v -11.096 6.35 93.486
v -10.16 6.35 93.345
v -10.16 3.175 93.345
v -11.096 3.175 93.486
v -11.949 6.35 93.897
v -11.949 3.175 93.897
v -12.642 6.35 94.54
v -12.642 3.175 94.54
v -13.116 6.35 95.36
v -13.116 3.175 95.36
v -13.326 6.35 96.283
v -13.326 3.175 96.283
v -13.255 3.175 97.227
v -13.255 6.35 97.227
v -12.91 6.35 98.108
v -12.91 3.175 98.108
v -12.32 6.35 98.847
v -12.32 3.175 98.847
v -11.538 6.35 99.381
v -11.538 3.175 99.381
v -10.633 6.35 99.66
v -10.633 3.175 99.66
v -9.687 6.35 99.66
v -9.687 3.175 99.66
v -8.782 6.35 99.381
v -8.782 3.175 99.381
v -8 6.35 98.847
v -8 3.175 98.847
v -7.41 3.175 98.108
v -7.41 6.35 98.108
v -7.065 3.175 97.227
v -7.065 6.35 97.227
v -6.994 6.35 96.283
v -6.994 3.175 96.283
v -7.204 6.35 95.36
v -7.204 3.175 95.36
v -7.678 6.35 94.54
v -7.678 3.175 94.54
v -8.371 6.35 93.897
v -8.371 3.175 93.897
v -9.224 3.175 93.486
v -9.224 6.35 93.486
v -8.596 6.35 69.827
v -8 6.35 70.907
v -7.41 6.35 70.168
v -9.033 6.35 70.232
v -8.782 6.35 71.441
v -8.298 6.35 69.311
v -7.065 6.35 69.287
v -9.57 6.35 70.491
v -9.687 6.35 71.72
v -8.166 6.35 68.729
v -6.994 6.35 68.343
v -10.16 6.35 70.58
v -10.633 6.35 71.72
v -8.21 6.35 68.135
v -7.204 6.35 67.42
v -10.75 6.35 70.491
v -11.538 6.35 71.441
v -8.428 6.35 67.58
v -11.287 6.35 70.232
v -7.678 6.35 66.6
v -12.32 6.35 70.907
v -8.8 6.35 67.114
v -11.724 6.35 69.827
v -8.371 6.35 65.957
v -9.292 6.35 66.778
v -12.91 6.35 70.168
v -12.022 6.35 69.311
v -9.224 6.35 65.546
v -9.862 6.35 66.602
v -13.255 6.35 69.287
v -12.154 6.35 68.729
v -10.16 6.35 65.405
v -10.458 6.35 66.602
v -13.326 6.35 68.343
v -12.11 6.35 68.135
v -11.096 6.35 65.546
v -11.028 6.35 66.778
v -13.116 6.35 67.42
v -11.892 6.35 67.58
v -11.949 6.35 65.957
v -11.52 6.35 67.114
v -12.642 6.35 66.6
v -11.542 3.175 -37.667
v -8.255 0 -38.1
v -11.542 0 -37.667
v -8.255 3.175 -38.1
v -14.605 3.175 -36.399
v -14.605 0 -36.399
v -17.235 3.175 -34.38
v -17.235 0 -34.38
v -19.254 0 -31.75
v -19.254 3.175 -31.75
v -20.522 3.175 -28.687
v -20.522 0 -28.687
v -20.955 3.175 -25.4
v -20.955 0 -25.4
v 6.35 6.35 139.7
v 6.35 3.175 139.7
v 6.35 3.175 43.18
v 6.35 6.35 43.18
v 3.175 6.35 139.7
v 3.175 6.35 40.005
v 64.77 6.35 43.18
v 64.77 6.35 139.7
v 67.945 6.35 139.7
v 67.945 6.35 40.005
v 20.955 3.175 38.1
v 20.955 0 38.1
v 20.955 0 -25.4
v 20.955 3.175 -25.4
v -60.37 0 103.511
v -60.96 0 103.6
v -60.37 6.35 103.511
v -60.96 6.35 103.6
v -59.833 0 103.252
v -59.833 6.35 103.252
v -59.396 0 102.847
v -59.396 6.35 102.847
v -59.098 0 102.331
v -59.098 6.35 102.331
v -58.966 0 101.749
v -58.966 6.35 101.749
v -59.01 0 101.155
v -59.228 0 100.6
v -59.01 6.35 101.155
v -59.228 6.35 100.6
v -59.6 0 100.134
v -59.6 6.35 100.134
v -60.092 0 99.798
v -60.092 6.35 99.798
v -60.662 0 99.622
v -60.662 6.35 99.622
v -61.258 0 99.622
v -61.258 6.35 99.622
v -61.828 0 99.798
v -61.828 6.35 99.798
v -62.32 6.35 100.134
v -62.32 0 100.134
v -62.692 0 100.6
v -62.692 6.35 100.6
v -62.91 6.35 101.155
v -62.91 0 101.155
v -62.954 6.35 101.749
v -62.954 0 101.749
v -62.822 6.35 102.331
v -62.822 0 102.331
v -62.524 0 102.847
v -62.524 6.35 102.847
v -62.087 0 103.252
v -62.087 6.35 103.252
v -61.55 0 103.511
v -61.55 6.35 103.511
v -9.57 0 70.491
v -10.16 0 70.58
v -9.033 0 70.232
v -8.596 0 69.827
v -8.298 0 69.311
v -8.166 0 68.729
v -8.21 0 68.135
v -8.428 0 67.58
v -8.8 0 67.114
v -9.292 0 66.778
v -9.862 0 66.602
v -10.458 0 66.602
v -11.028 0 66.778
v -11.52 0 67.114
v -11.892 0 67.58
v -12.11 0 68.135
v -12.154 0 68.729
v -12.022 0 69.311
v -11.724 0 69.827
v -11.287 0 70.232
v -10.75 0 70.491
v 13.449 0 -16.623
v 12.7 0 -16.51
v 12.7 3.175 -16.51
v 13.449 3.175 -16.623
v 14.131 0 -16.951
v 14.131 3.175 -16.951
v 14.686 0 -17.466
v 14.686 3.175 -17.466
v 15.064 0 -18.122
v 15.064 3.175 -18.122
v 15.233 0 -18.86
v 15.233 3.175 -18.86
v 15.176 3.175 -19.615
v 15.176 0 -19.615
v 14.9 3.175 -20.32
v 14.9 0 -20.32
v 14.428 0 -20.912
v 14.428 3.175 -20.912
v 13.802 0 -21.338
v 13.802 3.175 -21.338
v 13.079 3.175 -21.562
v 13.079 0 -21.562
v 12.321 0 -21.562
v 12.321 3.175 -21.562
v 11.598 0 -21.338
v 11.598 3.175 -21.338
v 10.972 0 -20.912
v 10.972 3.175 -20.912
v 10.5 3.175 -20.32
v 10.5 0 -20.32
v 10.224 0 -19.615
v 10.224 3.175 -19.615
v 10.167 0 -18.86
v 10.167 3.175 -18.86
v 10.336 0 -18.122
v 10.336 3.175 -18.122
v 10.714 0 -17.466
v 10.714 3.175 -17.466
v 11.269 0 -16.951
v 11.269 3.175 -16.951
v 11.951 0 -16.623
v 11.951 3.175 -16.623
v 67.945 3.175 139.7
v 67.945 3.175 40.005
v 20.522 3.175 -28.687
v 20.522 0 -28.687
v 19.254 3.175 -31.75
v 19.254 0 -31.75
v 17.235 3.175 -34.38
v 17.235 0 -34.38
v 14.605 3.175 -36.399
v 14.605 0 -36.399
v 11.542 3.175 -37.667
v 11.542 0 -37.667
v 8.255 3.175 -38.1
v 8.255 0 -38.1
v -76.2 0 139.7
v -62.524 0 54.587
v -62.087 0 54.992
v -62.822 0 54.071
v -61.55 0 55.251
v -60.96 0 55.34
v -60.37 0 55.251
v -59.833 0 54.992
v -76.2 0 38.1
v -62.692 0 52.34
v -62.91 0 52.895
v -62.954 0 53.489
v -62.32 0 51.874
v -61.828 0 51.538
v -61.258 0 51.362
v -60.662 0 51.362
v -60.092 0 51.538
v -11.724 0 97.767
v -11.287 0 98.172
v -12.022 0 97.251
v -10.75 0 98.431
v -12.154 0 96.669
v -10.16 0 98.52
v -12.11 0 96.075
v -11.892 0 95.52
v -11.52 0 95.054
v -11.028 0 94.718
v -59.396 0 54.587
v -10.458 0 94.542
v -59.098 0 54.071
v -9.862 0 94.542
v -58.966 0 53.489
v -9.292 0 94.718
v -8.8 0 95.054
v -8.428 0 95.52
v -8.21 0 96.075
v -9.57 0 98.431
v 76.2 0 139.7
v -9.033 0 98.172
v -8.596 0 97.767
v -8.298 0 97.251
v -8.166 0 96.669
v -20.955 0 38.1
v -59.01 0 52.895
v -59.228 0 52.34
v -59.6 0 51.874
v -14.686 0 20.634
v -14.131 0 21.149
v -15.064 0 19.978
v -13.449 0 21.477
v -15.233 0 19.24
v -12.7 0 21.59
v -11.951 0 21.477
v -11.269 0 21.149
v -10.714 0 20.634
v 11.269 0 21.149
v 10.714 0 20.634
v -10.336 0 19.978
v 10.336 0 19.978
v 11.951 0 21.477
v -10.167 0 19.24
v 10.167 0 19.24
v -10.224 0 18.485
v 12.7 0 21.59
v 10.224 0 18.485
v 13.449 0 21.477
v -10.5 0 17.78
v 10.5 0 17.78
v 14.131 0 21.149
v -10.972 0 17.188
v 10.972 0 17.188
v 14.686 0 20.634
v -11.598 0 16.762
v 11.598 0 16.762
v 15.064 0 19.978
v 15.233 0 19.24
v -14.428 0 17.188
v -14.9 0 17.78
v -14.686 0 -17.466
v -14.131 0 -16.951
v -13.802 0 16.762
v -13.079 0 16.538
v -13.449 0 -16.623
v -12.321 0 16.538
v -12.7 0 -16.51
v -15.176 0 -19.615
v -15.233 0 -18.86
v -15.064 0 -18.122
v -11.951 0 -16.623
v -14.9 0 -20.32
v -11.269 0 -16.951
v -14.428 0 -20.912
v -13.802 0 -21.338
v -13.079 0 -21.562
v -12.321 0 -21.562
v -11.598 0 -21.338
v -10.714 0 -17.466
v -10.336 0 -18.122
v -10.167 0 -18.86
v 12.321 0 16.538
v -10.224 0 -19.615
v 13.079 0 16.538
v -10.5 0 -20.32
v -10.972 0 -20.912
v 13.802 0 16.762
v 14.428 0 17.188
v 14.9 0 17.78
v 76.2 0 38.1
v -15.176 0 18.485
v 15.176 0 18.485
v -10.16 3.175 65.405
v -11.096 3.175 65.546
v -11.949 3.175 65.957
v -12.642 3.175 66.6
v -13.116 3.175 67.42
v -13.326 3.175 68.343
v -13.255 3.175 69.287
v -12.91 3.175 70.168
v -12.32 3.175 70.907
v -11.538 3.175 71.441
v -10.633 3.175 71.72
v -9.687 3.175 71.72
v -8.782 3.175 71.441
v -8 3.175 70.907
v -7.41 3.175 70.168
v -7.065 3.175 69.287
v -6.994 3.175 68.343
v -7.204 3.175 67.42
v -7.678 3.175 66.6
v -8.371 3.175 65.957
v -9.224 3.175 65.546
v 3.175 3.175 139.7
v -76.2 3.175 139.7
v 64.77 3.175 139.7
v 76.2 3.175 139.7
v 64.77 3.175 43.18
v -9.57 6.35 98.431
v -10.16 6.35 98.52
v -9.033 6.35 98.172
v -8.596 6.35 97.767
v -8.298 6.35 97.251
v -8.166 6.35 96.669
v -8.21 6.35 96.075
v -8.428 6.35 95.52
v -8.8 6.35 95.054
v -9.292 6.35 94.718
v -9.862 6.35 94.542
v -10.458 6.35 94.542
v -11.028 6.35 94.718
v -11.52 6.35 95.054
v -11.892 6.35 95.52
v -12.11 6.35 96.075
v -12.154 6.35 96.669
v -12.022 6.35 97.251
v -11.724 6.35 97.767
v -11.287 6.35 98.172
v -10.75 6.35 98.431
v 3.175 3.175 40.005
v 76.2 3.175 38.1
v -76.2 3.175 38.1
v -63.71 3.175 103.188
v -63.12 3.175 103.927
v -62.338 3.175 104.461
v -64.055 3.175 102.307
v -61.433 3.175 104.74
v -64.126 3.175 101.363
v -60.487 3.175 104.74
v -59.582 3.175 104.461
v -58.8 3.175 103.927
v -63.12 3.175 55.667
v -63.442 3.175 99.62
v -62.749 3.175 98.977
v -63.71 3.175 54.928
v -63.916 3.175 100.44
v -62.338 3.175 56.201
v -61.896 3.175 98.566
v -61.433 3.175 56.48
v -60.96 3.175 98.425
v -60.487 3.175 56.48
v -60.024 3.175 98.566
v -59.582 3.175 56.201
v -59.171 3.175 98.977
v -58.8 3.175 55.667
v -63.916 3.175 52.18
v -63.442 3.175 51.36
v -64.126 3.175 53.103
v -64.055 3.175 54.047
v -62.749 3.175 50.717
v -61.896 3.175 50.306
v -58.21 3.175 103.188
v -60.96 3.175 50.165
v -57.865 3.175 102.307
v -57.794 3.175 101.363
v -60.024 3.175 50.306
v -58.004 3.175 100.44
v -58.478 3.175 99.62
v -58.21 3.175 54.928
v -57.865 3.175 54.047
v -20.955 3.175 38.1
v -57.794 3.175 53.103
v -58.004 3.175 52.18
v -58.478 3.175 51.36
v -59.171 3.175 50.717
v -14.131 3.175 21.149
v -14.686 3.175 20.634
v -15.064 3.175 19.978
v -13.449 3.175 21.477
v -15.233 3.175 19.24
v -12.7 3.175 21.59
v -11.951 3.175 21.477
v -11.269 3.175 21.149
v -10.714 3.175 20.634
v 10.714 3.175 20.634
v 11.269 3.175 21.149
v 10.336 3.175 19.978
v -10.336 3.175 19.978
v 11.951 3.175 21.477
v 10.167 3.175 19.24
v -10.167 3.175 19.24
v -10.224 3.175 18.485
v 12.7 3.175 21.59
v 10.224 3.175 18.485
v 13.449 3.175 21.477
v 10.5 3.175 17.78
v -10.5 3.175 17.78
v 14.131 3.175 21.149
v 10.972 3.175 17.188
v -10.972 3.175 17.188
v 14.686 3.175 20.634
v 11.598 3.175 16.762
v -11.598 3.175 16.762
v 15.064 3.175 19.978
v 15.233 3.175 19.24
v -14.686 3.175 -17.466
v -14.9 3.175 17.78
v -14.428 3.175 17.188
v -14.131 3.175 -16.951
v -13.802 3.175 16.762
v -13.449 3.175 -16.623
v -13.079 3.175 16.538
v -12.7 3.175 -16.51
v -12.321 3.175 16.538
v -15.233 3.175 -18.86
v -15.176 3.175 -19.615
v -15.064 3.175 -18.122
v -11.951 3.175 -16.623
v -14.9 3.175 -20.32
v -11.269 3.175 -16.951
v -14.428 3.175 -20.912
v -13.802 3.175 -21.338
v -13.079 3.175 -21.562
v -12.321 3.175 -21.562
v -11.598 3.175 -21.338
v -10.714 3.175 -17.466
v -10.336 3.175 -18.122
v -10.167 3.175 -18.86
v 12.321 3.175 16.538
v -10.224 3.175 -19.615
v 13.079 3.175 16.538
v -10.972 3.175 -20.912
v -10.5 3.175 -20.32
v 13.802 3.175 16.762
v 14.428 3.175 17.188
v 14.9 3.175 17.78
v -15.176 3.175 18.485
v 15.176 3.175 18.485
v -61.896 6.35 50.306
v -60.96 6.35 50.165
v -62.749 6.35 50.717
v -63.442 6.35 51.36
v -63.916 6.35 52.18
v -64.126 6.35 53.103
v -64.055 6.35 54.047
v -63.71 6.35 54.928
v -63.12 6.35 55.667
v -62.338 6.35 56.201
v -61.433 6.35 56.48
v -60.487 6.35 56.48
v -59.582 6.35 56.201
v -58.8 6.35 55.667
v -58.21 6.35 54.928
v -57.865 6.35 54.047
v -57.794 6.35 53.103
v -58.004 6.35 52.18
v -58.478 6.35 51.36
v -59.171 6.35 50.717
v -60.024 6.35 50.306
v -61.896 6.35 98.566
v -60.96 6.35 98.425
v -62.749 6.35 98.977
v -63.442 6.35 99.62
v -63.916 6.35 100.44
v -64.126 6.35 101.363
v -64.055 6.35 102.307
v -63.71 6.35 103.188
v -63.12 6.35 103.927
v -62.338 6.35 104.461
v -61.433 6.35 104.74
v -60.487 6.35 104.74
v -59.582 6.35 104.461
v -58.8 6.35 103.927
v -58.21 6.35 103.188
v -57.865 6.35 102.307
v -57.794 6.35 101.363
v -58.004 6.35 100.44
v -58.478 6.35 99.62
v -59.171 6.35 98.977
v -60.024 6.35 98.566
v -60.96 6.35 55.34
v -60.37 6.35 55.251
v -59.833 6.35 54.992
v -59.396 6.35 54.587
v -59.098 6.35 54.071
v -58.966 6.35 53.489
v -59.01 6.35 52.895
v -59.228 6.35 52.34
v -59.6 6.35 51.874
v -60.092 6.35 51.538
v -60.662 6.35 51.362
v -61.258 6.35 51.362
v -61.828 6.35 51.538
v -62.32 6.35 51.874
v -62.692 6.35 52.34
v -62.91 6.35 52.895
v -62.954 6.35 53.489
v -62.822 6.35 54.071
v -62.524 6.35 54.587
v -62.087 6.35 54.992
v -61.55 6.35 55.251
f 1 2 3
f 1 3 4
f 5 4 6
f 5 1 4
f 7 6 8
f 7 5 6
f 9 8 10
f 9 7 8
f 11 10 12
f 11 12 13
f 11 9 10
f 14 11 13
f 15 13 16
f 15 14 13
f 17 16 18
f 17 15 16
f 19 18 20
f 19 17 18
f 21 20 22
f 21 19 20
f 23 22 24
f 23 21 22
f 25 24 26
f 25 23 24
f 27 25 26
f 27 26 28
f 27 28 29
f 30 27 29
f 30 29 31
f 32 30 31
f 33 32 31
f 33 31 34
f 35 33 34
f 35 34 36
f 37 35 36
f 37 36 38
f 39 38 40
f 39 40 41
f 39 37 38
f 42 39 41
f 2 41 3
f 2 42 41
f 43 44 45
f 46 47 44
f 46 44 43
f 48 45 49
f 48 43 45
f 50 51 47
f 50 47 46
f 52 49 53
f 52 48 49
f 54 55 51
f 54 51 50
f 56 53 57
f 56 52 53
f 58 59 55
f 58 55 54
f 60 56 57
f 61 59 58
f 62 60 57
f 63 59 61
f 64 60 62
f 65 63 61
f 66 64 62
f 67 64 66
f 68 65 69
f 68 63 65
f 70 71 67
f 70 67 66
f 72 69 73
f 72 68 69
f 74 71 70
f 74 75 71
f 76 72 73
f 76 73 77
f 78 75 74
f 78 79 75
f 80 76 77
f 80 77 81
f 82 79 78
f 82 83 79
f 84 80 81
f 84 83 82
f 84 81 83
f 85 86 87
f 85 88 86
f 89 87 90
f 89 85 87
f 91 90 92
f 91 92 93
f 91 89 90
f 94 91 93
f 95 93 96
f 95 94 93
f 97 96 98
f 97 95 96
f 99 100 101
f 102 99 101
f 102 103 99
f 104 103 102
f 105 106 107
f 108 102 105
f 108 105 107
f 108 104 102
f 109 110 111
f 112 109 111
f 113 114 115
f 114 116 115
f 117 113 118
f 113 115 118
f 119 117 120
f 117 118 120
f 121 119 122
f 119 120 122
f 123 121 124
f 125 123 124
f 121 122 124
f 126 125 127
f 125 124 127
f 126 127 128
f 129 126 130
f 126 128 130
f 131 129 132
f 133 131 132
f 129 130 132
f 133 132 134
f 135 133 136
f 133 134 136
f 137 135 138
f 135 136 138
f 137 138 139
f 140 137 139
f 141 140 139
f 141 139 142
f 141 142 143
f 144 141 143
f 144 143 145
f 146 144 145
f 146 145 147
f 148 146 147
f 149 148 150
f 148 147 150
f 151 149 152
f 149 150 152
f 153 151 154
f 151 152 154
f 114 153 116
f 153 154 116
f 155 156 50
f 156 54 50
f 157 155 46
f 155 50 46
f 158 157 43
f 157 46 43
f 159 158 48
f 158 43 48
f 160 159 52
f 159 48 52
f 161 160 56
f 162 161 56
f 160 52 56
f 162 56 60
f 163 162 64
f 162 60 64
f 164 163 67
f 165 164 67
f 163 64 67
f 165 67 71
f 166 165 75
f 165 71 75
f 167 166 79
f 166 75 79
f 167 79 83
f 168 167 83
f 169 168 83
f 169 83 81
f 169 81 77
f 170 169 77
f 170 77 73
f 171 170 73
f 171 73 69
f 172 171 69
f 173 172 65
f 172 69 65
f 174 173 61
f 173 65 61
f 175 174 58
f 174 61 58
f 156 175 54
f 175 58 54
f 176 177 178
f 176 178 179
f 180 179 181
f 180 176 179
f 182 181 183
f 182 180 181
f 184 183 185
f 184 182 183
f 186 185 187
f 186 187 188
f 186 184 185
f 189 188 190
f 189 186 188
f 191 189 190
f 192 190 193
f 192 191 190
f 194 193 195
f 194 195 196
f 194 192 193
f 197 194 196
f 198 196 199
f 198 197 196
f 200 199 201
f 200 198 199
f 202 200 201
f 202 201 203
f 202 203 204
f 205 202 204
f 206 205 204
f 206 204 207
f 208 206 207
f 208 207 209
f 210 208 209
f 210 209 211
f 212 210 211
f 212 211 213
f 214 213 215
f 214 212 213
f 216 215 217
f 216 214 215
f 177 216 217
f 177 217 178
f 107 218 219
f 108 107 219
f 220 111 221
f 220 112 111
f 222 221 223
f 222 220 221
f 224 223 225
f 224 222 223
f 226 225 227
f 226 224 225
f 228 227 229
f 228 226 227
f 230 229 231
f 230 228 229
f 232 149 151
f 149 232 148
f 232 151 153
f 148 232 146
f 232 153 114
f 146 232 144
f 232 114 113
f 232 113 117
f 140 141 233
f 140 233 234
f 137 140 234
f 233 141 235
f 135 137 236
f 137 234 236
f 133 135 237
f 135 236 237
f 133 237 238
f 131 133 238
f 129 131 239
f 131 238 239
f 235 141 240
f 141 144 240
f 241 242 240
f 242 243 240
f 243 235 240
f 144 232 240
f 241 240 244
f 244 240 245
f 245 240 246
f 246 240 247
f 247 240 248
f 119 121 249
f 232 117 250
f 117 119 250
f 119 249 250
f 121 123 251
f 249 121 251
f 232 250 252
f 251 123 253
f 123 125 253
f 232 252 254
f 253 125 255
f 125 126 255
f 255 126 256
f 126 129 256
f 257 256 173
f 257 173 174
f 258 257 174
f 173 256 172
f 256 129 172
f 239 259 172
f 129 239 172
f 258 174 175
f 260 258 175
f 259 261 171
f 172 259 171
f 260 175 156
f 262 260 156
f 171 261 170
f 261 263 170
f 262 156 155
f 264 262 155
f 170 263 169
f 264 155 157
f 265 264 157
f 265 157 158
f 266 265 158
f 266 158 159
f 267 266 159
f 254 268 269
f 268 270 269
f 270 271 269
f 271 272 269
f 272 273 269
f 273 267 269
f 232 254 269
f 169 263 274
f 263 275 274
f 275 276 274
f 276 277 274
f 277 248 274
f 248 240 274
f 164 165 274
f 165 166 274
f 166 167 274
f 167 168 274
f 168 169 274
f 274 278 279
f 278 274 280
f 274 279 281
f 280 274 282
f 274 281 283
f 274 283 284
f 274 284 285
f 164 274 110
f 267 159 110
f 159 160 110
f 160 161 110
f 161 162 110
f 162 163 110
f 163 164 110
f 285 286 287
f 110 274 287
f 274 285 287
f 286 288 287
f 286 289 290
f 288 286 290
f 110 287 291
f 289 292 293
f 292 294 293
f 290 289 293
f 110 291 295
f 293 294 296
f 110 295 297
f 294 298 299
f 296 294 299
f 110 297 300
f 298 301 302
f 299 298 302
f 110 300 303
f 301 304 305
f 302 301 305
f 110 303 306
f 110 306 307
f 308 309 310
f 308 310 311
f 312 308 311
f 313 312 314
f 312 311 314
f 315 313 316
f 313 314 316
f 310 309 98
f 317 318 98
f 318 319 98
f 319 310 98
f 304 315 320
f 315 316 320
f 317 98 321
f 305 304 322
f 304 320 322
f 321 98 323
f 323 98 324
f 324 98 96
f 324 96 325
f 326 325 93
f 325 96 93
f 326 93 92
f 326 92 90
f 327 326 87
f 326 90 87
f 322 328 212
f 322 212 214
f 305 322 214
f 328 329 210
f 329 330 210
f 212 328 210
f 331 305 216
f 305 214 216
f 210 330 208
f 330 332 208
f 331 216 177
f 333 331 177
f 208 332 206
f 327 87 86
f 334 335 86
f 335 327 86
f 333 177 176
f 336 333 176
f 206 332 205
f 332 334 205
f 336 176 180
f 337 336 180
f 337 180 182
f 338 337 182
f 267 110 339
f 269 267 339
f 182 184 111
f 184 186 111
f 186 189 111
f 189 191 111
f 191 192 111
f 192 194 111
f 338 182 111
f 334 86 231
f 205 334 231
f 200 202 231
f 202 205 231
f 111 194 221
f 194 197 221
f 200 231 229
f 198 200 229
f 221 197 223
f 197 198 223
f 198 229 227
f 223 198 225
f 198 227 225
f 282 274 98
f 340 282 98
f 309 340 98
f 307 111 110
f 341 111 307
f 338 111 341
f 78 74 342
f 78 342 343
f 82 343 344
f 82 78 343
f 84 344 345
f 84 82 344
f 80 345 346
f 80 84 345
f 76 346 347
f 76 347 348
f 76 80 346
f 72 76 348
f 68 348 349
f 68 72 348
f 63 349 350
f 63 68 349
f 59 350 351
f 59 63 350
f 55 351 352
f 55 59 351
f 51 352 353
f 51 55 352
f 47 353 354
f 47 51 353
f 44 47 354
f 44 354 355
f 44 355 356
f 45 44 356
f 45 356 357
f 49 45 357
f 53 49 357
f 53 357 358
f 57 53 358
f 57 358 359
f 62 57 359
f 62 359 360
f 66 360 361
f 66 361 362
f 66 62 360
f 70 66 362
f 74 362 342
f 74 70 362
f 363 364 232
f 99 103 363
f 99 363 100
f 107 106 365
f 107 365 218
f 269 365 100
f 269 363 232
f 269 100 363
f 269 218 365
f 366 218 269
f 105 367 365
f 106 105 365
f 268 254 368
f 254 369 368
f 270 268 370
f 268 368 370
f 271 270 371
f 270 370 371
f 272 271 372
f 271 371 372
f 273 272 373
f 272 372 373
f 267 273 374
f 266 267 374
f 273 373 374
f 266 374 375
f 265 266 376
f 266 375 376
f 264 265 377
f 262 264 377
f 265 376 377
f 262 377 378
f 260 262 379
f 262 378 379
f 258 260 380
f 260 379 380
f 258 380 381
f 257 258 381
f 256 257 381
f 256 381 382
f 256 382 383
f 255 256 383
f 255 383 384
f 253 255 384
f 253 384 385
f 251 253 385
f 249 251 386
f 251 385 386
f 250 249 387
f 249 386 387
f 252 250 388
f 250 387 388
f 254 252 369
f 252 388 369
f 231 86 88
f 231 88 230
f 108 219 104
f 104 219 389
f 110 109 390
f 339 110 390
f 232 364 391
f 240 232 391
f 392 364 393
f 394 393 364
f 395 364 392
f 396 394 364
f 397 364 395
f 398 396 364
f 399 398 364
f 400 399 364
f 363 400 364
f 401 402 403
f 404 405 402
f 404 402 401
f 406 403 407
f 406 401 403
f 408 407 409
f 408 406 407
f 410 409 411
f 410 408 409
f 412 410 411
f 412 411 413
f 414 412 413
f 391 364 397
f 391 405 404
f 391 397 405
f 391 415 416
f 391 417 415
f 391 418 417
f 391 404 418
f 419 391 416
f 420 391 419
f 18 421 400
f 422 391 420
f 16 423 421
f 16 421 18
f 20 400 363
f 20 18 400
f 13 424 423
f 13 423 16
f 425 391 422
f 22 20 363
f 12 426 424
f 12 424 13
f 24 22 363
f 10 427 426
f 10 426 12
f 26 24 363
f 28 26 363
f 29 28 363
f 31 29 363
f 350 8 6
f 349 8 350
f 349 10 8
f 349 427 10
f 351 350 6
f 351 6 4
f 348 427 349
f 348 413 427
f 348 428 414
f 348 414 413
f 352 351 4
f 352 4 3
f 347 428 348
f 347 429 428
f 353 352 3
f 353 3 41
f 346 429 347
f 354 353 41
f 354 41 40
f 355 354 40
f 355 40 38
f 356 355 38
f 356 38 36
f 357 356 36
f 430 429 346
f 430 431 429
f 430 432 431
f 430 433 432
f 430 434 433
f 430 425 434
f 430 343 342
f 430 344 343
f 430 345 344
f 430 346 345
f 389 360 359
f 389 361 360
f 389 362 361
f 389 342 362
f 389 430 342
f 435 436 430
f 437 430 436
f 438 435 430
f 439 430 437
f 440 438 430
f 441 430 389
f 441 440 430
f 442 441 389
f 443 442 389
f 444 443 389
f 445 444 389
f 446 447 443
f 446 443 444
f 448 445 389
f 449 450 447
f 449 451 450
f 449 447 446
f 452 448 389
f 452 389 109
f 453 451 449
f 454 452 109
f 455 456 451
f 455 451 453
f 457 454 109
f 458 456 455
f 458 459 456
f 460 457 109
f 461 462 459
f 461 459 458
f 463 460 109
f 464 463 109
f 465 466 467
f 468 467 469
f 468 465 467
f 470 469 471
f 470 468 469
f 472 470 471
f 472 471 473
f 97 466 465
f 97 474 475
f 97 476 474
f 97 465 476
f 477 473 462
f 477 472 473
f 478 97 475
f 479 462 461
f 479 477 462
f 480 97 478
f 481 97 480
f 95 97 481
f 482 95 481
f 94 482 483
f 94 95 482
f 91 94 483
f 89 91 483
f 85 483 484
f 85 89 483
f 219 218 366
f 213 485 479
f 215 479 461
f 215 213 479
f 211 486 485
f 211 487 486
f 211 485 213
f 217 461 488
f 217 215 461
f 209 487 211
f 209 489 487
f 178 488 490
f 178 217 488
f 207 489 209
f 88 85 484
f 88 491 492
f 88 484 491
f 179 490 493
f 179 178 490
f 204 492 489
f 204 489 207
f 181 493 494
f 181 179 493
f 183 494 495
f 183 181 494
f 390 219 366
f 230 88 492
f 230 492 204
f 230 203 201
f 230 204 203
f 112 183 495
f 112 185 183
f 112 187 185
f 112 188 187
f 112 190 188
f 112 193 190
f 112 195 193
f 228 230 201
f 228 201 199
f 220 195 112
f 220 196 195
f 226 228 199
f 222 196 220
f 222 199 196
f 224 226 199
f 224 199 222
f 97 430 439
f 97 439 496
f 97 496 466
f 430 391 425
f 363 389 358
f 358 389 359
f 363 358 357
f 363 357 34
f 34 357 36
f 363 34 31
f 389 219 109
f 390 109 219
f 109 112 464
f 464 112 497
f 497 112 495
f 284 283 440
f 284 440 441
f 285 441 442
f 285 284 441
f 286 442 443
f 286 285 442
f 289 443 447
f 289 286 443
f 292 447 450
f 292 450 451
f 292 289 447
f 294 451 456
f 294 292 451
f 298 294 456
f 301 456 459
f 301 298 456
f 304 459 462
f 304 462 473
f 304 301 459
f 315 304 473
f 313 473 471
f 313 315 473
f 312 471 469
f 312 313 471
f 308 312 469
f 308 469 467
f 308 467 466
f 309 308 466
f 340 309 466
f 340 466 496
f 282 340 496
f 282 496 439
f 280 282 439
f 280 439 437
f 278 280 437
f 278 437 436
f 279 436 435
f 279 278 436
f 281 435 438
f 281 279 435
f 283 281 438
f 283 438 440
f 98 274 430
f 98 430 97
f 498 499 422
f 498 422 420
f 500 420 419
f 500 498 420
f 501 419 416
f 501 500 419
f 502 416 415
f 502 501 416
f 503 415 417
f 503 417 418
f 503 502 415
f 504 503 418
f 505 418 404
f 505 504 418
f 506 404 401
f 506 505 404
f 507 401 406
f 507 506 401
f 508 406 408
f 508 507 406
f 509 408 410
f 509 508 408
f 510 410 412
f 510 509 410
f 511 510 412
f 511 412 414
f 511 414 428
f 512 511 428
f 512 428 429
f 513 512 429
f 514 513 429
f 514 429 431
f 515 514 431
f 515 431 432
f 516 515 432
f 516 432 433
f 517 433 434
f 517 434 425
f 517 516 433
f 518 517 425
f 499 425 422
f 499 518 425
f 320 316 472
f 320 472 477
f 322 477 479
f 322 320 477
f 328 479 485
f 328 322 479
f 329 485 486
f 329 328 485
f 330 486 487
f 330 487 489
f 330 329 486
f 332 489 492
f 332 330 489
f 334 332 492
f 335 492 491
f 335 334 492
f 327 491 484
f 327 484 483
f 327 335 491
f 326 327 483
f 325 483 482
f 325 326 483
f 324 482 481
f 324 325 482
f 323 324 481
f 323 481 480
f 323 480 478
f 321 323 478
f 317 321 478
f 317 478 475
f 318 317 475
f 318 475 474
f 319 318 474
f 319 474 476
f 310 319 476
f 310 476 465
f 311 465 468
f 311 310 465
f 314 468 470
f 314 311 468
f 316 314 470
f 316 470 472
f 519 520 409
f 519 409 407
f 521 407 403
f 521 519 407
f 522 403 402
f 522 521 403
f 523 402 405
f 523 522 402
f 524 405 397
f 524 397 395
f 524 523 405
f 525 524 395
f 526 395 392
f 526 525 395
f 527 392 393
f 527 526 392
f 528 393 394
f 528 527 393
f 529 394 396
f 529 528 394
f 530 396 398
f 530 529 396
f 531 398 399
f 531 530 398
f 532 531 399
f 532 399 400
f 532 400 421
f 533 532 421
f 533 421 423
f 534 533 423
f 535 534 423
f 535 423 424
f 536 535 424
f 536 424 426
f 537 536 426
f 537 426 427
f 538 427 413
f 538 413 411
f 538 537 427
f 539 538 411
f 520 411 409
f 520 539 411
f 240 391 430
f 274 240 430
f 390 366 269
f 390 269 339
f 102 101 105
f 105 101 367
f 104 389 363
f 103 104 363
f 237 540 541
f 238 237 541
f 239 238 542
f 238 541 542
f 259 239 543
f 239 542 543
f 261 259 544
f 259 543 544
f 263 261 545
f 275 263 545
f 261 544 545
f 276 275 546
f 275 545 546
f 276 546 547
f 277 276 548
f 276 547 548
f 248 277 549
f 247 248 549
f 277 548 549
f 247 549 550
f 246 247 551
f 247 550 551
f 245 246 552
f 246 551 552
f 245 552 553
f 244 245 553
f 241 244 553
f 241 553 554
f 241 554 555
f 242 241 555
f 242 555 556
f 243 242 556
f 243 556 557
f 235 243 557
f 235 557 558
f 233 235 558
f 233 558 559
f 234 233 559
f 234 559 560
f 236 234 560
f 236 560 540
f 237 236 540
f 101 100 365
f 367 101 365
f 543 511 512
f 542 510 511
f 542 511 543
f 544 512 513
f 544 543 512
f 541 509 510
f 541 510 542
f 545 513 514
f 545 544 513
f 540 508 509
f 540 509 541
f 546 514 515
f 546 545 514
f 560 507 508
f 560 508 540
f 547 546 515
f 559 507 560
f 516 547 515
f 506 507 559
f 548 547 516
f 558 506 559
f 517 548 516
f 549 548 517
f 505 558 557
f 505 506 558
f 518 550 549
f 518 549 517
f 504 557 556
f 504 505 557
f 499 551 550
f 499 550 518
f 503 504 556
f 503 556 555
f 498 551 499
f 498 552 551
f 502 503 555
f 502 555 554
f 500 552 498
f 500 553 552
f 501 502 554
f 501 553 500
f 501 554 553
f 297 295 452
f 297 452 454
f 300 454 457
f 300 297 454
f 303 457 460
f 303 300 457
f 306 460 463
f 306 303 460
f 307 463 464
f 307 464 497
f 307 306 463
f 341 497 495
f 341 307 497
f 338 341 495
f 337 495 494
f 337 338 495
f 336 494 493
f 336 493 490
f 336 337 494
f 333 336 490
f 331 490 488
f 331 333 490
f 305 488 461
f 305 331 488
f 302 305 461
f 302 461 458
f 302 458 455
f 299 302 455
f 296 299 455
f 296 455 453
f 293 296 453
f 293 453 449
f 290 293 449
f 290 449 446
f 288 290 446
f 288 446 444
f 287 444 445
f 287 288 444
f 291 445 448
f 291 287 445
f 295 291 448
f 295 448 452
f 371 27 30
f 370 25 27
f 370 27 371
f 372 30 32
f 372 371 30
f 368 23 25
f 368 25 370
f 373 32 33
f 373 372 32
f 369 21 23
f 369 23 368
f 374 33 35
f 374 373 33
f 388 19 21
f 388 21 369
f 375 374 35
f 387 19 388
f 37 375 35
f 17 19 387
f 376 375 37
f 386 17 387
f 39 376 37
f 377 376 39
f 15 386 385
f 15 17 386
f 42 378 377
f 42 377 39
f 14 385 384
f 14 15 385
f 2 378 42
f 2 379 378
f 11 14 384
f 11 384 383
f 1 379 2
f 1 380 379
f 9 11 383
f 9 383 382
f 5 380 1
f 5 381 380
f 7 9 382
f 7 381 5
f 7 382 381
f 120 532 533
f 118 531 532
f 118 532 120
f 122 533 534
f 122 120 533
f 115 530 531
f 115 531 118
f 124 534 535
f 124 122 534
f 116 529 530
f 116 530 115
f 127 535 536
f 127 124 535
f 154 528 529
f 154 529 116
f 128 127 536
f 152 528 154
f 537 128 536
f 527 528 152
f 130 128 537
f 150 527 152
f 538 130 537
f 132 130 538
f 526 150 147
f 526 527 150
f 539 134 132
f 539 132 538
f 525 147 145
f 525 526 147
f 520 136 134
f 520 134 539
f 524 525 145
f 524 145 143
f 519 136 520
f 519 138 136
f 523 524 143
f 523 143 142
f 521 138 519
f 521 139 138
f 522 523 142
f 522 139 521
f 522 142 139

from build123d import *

# Parameters (mm, degrees)
SKETCH1_W           = 41.91
SKETCH1_H           = 76.2
SKETCH1_R           = 2.54
BOSS_EXTRUDE1_DEPTH = 3.175
SKETCH2_W           = 152.4
SKETCH2_H           = 101.6
BOSS_EXTRUDE2_DEPTH = 3.175
SKETCH3_R           = 2
CUT_EXTRUDE1_DEPTH  = 160.162214816
BOSS_EXTRUDE3_DEPTH = 3.175
BOSS_EXTRUDE4_START = 3.175
SKETCH5_R           = 3.175
SKETCH5_R_2         = 2
BOSS_EXTRUDE4_DEPTH = 3.175
FILLET1_R           = 12.7


with BuildPart() as part:
    # Sketch1 → Boss-Extrude1 (new body)
    with BuildSketch(Plane(origin=(0, 0, 0), x_dir=(1, 0, 0), z_dir=(0, 1, 0))):
        Rectangle(SKETCH1_W, SKETCH1_H)
        with Locations(Location((-12.7, 19.05, 0), (0, 0, 270))):
            Circle(SKETCH1_R, mode=Mode.SUBTRACT)
        with Locations(Location((-12.7, -19.05, 0), (0, 0, 270))):
            Circle(SKETCH1_R, mode=Mode.SUBTRACT)
        with Locations(Location((12.7, -19.05, 0), (0, 0, 270))):
            Circle(SKETCH1_R, mode=Mode.SUBTRACT)
        with Locations(Location((12.7, 19.05, 0), (0, 0, 270))):
            Circle(SKETCH1_R, mode=Mode.SUBTRACT)
    extrude(amount=BOSS_EXTRUDE1_DEPTH)

    # Sketch2 → Boss-Extrude2 (add)
    with BuildSketch(Plane(origin=(0, 3.175, 0), x_dir=(1, 0, 0), z_dir=(0, 1, 0))):
        with Locations((0, -88.9)):
            Rectangle(SKETCH2_W, SKETCH2_H)
    extrude(amount=-BOSS_EXTRUDE2_DEPTH)

    # Sketch3 → Cut-Extrude1 (cut, through all)
    with BuildSketch(Plane(origin=(0, 3.175, 0), x_dir=(1, 0, 0), z_dir=(0, 1, 0))):
        with Locations(Location((-60.96, -53.34, 0), (0, 0, 270))):
            Circle(SKETCH3_R)
        with Locations(Location((-60.96, -101.6, 0), (0, 0, 270))):
            Circle(SKETCH3_R)
        with Locations(Location((-10.16, -68.58, 0), (0, 0, 270))):
            Circle(SKETCH3_R)
        with Locations(Location((-10.16, -96.52, 0), (0, 0, 270))):
            Circle(SKETCH3_R)
    extrude(amount=-CUT_EXTRUDE1_DEPTH, mode=Mode.SUBTRACT)

    # Sketch4 → Boss-Extrude3 (add)
    with BuildSketch(Plane(origin=(0, 3.175, 0), x_dir=(1, 0, 0), z_dir=(0, 1, 0))):
        Polygon((64.77, -43.18), (64.77, -120.65), (64.77, -139.7), (67.945, -139.7), (67.945, -120.65), (67.945, -40.005), (3.175, -40.005), (3.175, -120.65), (3.175, -139.7), (6.35, -139.7), (6.35, -120.65), (6.35, -43.18), align=None)
    extrude(amount=BOSS_EXTRUDE3_DEPTH)

    # Sketch5 → Boss-Extrude4 (add)
    # profile 1 of 4: a face of its own
    with BuildSketch(Plane(origin=(0, 3.175, 0), x_dir=(1, 0, 0), z_dir=(0, 1, 0)).offset(BOSS_EXTRUDE4_START)):
        with Locations(Location((-60.96, -53.34, 0), (0, 0, 90))):
            Circle(SKETCH5_R)
        with Locations(Location((-60.96, -53.34, 0), (0, 0, 270))):
            Circle(SKETCH5_R_2, mode=Mode.SUBTRACT)
    # profile 2 of 4: a face of its own
    with BuildSketch(Plane(origin=(0, 3.175, 0), x_dir=(1, 0, 0), z_dir=(0, 1, 0)).offset(BOSS_EXTRUDE4_START)):
        with Locations(Location((-60.96, -101.6, 0), (0, 0, 90))):
            Circle(SKETCH5_R)
        with Locations(Location((-60.96, -101.6, 0), (0, 0, 270))):
            Circle(SKETCH5_R_2, mode=Mode.SUBTRACT)
    # profile 3 of 4: a face of its own
    with BuildSketch(Plane(origin=(0, 3.175, 0), x_dir=(1, 0, 0), z_dir=(0, 1, 0)).offset(BOSS_EXTRUDE4_START)):
        with Locations(Location((-10.16, -96.52, 0), (0, 0, 90))):
            Circle(SKETCH5_R)
        with Locations(Location((-10.16, -96.52, 0), (0, 0, 270))):
            Circle(SKETCH5_R_2, mode=Mode.SUBTRACT)
    # profile 4 of 4: a face of its own
    with BuildSketch(Plane(origin=(0, 3.175, 0), x_dir=(1, 0, 0), z_dir=(0, 1, 0)).offset(BOSS_EXTRUDE4_START)):
        with Locations(Location((-10.16, -68.58, 0), (0, 0, 90))):
            Circle(SKETCH5_R)
        with Locations(Location((-10.16, -68.58, 0), (0, 0, 270))):
            Circle(SKETCH5_R_2, mode=Mode.SUBTRACT)
    extrude(amount=-BOSS_EXTRUDE4_DEPTH)

    # Fillet1
    fillet1_edges = [part.edges().sort_by_distance(p)[0] for p in [
        (-20.955, 1.5875, -38.1),
        (20.955, 1.5875, -38.1),
    ]]
    fillet(fillet1_edges, radius=FILLET1_R)


solid = part.part
